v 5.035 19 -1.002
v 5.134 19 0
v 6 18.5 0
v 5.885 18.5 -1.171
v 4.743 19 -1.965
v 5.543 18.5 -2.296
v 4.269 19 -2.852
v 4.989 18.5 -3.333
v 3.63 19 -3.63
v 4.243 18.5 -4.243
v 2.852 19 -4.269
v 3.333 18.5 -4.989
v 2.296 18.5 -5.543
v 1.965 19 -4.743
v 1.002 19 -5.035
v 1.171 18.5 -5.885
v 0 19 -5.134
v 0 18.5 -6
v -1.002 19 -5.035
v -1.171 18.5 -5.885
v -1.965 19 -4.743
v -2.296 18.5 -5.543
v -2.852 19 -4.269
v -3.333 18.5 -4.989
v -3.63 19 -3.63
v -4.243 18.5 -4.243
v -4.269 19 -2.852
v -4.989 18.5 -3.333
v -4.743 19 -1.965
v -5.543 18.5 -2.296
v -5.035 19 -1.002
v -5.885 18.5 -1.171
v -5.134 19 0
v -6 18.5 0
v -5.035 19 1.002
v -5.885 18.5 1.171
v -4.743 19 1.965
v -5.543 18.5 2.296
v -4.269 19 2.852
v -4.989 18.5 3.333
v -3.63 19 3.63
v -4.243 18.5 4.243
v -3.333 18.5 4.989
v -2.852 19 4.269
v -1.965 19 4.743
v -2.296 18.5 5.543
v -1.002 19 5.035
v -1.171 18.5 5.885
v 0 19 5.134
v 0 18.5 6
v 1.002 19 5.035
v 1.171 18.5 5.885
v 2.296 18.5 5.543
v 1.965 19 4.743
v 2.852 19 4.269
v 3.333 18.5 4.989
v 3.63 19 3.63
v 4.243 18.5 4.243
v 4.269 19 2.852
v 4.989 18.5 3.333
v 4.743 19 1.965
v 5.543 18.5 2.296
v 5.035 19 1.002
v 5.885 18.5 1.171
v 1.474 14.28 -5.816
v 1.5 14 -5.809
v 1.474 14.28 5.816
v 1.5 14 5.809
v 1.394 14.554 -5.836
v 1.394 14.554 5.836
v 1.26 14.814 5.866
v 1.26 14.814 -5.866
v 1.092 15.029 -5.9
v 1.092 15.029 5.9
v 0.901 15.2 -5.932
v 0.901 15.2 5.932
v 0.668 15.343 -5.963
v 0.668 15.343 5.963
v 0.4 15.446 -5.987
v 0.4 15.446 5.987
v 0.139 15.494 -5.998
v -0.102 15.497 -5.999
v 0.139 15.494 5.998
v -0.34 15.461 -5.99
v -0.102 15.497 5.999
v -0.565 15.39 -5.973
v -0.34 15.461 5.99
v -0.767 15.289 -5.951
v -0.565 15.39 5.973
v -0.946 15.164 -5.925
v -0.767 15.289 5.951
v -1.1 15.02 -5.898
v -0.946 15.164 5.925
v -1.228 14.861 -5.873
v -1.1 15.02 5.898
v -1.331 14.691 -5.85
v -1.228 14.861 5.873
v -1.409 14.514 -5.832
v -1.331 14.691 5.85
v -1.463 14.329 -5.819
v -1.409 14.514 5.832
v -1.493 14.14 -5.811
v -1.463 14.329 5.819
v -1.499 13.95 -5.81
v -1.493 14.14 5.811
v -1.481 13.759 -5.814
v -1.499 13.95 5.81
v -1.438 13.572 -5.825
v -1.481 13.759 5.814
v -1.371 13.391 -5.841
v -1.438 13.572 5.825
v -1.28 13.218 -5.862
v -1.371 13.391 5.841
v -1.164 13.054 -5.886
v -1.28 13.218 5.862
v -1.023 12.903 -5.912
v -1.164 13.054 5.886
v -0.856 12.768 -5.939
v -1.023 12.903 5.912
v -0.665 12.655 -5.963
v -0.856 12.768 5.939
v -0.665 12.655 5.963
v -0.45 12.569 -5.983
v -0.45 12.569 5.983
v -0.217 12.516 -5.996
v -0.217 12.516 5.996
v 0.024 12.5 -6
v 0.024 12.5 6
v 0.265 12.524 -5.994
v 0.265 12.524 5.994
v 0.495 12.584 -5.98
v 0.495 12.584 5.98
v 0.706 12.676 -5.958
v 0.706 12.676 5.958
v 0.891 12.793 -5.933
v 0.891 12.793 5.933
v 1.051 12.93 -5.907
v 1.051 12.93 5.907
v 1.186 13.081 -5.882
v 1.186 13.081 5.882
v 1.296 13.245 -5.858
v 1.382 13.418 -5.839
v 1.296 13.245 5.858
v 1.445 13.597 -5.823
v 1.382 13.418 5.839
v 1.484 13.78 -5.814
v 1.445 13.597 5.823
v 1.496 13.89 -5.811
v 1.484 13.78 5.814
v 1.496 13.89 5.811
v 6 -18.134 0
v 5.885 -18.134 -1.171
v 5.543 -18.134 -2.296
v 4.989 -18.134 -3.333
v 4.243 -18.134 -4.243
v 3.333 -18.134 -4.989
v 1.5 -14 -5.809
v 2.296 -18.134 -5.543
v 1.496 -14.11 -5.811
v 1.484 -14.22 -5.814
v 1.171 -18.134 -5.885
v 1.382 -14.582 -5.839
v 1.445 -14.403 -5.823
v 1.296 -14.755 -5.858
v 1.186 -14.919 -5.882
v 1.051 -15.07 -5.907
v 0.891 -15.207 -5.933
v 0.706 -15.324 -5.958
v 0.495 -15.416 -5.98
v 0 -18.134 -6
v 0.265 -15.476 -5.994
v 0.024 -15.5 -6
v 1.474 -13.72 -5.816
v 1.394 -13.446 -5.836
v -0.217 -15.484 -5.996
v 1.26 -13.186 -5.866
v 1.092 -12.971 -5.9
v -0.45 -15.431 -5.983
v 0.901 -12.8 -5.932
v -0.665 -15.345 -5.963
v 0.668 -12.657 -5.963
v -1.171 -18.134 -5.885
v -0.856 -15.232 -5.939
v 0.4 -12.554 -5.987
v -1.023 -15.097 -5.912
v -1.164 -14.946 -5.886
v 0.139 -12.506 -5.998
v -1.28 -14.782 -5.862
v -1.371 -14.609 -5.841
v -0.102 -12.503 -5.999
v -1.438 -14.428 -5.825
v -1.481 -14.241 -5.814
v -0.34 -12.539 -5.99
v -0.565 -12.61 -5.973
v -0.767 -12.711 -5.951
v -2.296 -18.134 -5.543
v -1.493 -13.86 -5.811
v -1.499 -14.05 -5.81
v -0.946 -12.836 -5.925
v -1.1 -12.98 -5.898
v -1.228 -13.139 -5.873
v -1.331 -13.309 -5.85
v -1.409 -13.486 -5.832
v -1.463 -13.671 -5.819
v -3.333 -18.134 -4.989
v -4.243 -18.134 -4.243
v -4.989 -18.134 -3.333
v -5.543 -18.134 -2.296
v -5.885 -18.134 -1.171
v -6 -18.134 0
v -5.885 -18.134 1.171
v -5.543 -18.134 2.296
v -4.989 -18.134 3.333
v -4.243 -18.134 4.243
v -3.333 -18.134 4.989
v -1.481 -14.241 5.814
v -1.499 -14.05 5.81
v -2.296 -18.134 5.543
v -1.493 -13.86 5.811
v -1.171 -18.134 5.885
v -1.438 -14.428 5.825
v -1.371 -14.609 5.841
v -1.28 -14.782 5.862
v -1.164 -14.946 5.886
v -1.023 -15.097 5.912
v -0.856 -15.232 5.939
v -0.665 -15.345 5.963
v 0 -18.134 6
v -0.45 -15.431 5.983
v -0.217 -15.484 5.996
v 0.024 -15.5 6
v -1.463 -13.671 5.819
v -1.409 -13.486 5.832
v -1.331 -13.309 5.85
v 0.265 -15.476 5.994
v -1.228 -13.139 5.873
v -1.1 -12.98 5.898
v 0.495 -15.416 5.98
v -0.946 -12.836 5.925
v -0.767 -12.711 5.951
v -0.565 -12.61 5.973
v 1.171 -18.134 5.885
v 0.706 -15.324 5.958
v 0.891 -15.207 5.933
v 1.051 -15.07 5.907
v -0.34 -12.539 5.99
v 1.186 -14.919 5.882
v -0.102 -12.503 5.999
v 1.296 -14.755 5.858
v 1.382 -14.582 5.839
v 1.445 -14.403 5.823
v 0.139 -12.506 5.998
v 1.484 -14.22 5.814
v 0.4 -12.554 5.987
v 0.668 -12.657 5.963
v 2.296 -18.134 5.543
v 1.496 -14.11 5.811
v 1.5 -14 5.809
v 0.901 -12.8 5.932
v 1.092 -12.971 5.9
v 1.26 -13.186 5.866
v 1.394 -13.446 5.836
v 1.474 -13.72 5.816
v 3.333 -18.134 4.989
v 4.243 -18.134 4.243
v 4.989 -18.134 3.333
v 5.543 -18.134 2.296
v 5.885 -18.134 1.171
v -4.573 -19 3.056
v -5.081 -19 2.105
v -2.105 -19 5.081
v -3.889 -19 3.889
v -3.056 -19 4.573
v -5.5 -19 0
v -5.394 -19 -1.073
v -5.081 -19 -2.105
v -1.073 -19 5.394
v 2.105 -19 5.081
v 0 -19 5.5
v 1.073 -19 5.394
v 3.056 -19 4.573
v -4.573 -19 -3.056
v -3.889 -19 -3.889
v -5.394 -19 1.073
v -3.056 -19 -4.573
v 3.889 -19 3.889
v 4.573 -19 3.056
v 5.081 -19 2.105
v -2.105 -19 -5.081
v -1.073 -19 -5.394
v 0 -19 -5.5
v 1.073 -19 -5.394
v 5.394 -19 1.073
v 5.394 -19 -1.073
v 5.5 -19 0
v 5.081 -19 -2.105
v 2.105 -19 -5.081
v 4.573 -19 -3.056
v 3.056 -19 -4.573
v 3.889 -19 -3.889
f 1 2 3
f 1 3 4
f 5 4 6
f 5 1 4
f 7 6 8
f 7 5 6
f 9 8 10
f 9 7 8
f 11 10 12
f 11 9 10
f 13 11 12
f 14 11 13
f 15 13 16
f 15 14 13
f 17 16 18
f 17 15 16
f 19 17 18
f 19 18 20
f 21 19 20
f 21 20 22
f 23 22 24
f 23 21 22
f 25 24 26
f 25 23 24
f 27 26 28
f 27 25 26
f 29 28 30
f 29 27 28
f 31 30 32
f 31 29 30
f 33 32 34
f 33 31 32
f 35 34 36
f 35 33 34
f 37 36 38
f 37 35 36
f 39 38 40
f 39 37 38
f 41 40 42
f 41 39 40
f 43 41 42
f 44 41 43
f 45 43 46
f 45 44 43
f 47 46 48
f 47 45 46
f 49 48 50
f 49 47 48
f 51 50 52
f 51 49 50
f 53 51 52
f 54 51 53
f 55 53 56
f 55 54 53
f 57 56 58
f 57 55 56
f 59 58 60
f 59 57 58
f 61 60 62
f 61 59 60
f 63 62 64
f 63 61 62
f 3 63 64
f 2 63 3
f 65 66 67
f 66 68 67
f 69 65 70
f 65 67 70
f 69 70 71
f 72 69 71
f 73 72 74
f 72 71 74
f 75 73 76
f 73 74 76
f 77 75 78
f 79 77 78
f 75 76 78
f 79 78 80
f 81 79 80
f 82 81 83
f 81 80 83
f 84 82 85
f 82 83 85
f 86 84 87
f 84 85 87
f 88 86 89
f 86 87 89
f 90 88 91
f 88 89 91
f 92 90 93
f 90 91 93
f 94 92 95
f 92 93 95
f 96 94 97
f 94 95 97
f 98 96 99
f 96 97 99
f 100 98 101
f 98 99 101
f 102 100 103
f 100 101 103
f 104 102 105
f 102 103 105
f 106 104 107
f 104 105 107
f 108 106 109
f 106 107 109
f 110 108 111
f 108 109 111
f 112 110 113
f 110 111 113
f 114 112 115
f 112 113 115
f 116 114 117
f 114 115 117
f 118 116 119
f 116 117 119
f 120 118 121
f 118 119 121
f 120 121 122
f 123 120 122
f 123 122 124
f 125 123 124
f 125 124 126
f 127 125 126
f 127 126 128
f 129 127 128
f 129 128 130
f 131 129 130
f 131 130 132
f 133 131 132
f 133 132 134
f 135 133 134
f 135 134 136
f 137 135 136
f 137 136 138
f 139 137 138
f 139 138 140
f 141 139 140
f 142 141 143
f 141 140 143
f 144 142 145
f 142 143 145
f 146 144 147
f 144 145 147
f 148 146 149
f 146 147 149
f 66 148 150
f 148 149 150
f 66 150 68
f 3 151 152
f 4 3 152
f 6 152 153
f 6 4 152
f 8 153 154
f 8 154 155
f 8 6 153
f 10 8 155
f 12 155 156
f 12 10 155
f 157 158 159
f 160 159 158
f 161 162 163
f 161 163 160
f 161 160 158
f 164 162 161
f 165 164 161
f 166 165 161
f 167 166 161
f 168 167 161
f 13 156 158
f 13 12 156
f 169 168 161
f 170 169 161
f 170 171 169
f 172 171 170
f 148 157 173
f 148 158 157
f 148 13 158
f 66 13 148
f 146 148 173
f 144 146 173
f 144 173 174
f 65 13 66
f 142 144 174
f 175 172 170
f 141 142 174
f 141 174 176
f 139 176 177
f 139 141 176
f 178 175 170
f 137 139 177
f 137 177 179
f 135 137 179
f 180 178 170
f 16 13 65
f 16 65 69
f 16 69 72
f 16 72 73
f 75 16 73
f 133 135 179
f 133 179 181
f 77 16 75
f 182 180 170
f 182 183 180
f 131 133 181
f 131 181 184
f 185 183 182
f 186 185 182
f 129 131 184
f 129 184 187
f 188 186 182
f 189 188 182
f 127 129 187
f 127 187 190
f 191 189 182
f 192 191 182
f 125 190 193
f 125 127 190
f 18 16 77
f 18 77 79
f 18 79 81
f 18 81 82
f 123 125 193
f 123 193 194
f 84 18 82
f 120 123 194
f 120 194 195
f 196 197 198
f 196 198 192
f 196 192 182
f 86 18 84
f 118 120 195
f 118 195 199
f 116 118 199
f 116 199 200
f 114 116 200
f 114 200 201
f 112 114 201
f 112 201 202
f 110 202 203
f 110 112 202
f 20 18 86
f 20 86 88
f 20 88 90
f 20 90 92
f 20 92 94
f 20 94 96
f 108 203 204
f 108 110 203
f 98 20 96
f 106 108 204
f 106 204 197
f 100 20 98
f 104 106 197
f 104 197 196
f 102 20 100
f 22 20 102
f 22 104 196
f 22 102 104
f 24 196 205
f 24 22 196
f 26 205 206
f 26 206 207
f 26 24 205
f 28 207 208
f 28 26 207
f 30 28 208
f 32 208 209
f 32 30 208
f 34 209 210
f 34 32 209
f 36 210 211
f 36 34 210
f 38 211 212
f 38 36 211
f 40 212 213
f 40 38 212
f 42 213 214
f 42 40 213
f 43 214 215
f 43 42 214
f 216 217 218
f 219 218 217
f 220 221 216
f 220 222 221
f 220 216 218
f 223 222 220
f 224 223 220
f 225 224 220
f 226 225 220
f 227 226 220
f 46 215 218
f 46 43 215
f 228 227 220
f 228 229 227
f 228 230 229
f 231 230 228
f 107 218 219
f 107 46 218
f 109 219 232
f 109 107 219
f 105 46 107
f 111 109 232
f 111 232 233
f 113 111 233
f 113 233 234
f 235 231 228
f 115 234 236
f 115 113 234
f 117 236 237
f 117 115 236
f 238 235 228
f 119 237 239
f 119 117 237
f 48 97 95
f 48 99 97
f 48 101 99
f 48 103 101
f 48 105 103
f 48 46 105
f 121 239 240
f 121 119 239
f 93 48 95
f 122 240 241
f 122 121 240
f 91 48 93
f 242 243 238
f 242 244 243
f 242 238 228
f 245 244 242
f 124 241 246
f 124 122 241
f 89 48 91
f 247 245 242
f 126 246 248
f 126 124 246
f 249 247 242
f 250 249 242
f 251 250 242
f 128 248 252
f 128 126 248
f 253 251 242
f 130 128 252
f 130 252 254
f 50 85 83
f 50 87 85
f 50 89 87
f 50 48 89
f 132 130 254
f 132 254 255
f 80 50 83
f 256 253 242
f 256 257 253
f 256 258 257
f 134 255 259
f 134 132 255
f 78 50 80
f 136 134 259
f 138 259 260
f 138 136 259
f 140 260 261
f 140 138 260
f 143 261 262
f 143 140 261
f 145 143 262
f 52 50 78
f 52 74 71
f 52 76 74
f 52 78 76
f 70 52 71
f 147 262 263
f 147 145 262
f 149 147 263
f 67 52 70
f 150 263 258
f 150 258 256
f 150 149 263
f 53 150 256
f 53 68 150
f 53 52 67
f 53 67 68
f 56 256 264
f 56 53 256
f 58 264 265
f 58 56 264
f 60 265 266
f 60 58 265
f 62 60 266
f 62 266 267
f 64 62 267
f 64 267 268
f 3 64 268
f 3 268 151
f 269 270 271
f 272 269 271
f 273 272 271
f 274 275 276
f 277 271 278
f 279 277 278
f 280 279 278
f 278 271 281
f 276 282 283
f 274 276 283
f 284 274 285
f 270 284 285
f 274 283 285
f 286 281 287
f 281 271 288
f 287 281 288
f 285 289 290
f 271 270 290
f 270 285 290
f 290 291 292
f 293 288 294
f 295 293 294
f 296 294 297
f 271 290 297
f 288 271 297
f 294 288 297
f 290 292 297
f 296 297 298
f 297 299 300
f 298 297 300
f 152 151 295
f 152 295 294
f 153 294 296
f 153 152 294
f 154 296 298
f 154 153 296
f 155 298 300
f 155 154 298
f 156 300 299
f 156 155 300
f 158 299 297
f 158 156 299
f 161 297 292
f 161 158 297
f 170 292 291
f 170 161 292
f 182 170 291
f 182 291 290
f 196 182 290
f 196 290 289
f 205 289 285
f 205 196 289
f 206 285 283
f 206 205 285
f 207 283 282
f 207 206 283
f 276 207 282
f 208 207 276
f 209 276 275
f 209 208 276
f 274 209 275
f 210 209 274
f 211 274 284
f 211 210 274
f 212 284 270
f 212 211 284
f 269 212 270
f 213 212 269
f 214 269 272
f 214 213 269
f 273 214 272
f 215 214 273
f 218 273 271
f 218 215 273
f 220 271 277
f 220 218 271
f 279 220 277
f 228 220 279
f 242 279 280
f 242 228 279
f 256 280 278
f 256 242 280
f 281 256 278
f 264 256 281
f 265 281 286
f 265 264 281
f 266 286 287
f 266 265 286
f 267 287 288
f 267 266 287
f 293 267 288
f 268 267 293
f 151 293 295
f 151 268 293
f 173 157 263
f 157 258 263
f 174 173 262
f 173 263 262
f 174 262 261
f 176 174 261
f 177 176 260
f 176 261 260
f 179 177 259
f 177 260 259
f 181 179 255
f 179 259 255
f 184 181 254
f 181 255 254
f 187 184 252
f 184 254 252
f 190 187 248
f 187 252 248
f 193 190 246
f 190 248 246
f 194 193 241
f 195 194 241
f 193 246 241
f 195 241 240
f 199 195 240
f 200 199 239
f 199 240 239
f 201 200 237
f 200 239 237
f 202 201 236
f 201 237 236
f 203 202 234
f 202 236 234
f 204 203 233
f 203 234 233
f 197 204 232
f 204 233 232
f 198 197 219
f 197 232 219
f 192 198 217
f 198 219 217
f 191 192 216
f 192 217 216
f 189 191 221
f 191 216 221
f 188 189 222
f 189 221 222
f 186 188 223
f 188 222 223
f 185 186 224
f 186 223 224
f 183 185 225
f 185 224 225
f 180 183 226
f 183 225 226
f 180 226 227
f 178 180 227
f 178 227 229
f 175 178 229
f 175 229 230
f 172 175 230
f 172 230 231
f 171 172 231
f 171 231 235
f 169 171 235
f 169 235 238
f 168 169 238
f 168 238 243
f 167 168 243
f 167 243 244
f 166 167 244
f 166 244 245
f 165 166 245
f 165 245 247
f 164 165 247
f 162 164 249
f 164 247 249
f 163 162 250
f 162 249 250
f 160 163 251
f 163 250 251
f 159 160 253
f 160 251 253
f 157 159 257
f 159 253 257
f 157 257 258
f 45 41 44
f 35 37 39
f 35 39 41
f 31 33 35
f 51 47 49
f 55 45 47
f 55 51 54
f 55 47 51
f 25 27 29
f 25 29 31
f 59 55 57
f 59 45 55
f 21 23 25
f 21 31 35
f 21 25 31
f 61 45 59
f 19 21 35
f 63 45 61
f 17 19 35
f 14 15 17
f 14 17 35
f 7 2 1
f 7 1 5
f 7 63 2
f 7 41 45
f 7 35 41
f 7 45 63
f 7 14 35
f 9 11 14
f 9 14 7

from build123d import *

# Parameters (mm, degrees)
SKETCH1_R               = 6
BOSS_EXTRUDE1_DEPTH     = 19
CHAMFER1_SIZE           = 0.5
CHAMFER1_SIZE2          = 0.866025404
CHAMFER1_PART_2_SIZE    = 0.5
CHAMFER1_PART_2_SIZE2   = 0.866025404
SKETCH2_R               = 1.5
CUT_EXTRUDE1_DEPTH      = 7
CUT_EXTRUDE1_DEPTH_BACK = 7


with BuildPart() as part:
    # Sketch1 → Boss-Extrude1 (new body, symmetric)
    with BuildSketch(Plane(origin=(0, 0, 0), x_dir=(1, 0, 0), z_dir=(0, 1, 0))):
        Circle(SKETCH1_R)
    extrude(amount=BOSS_EXTRUDE1_DEPTH, both=True)

    # Chamfer1
    chamfer1_edges = [part.edges().sort_by_distance(p)[0] for p in [
        (-6, -19, 0),
    ]]
    chamfer1_side = [part.faces().sort_by_distance(p)[0] for p in [
        (0, -19, 0),
    ]]
    chamfer(chamfer1_edges, length=CHAMFER1_SIZE, length2=CHAMFER1_SIZE2, reference=chamfer1_side[0])

    # Chamfer1 part 2
    chamfer1_part_2_edges = [part.edges().sort_by_distance(p)[0] for p in [
        (-6, 19, 0),
    ]]
    chamfer1_part_2_side = [part.faces().sort_by_distance(p)[0] for p in [
        (-6, 0, 0),
    ]]
    chamfer(chamfer1_part_2_edges, length=CHAMFER1_PART_2_SIZE, length2=CHAMFER1_PART_2_SIZE2, reference=chamfer1_part_2_side[0])

    # Sketch2 → Cut-Extrude1 (cut, two sides)
    with BuildSketch(Plane.XY) as cut_extrude1_sk:
        with Locations((0, 14)):
            Circle(SKETCH2_R)
        with Locations((0, -14)):
            Circle(SKETCH2_R)
    extrude(amount=CUT_EXTRUDE1_DEPTH, mode=Mode.SUBTRACT)
    extrude(cut_extrude1_sk.sketch, amount=-CUT_EXTRUDE1_DEPTH_BACK, mode=Mode.SUBTRACT)


solid = part.part
